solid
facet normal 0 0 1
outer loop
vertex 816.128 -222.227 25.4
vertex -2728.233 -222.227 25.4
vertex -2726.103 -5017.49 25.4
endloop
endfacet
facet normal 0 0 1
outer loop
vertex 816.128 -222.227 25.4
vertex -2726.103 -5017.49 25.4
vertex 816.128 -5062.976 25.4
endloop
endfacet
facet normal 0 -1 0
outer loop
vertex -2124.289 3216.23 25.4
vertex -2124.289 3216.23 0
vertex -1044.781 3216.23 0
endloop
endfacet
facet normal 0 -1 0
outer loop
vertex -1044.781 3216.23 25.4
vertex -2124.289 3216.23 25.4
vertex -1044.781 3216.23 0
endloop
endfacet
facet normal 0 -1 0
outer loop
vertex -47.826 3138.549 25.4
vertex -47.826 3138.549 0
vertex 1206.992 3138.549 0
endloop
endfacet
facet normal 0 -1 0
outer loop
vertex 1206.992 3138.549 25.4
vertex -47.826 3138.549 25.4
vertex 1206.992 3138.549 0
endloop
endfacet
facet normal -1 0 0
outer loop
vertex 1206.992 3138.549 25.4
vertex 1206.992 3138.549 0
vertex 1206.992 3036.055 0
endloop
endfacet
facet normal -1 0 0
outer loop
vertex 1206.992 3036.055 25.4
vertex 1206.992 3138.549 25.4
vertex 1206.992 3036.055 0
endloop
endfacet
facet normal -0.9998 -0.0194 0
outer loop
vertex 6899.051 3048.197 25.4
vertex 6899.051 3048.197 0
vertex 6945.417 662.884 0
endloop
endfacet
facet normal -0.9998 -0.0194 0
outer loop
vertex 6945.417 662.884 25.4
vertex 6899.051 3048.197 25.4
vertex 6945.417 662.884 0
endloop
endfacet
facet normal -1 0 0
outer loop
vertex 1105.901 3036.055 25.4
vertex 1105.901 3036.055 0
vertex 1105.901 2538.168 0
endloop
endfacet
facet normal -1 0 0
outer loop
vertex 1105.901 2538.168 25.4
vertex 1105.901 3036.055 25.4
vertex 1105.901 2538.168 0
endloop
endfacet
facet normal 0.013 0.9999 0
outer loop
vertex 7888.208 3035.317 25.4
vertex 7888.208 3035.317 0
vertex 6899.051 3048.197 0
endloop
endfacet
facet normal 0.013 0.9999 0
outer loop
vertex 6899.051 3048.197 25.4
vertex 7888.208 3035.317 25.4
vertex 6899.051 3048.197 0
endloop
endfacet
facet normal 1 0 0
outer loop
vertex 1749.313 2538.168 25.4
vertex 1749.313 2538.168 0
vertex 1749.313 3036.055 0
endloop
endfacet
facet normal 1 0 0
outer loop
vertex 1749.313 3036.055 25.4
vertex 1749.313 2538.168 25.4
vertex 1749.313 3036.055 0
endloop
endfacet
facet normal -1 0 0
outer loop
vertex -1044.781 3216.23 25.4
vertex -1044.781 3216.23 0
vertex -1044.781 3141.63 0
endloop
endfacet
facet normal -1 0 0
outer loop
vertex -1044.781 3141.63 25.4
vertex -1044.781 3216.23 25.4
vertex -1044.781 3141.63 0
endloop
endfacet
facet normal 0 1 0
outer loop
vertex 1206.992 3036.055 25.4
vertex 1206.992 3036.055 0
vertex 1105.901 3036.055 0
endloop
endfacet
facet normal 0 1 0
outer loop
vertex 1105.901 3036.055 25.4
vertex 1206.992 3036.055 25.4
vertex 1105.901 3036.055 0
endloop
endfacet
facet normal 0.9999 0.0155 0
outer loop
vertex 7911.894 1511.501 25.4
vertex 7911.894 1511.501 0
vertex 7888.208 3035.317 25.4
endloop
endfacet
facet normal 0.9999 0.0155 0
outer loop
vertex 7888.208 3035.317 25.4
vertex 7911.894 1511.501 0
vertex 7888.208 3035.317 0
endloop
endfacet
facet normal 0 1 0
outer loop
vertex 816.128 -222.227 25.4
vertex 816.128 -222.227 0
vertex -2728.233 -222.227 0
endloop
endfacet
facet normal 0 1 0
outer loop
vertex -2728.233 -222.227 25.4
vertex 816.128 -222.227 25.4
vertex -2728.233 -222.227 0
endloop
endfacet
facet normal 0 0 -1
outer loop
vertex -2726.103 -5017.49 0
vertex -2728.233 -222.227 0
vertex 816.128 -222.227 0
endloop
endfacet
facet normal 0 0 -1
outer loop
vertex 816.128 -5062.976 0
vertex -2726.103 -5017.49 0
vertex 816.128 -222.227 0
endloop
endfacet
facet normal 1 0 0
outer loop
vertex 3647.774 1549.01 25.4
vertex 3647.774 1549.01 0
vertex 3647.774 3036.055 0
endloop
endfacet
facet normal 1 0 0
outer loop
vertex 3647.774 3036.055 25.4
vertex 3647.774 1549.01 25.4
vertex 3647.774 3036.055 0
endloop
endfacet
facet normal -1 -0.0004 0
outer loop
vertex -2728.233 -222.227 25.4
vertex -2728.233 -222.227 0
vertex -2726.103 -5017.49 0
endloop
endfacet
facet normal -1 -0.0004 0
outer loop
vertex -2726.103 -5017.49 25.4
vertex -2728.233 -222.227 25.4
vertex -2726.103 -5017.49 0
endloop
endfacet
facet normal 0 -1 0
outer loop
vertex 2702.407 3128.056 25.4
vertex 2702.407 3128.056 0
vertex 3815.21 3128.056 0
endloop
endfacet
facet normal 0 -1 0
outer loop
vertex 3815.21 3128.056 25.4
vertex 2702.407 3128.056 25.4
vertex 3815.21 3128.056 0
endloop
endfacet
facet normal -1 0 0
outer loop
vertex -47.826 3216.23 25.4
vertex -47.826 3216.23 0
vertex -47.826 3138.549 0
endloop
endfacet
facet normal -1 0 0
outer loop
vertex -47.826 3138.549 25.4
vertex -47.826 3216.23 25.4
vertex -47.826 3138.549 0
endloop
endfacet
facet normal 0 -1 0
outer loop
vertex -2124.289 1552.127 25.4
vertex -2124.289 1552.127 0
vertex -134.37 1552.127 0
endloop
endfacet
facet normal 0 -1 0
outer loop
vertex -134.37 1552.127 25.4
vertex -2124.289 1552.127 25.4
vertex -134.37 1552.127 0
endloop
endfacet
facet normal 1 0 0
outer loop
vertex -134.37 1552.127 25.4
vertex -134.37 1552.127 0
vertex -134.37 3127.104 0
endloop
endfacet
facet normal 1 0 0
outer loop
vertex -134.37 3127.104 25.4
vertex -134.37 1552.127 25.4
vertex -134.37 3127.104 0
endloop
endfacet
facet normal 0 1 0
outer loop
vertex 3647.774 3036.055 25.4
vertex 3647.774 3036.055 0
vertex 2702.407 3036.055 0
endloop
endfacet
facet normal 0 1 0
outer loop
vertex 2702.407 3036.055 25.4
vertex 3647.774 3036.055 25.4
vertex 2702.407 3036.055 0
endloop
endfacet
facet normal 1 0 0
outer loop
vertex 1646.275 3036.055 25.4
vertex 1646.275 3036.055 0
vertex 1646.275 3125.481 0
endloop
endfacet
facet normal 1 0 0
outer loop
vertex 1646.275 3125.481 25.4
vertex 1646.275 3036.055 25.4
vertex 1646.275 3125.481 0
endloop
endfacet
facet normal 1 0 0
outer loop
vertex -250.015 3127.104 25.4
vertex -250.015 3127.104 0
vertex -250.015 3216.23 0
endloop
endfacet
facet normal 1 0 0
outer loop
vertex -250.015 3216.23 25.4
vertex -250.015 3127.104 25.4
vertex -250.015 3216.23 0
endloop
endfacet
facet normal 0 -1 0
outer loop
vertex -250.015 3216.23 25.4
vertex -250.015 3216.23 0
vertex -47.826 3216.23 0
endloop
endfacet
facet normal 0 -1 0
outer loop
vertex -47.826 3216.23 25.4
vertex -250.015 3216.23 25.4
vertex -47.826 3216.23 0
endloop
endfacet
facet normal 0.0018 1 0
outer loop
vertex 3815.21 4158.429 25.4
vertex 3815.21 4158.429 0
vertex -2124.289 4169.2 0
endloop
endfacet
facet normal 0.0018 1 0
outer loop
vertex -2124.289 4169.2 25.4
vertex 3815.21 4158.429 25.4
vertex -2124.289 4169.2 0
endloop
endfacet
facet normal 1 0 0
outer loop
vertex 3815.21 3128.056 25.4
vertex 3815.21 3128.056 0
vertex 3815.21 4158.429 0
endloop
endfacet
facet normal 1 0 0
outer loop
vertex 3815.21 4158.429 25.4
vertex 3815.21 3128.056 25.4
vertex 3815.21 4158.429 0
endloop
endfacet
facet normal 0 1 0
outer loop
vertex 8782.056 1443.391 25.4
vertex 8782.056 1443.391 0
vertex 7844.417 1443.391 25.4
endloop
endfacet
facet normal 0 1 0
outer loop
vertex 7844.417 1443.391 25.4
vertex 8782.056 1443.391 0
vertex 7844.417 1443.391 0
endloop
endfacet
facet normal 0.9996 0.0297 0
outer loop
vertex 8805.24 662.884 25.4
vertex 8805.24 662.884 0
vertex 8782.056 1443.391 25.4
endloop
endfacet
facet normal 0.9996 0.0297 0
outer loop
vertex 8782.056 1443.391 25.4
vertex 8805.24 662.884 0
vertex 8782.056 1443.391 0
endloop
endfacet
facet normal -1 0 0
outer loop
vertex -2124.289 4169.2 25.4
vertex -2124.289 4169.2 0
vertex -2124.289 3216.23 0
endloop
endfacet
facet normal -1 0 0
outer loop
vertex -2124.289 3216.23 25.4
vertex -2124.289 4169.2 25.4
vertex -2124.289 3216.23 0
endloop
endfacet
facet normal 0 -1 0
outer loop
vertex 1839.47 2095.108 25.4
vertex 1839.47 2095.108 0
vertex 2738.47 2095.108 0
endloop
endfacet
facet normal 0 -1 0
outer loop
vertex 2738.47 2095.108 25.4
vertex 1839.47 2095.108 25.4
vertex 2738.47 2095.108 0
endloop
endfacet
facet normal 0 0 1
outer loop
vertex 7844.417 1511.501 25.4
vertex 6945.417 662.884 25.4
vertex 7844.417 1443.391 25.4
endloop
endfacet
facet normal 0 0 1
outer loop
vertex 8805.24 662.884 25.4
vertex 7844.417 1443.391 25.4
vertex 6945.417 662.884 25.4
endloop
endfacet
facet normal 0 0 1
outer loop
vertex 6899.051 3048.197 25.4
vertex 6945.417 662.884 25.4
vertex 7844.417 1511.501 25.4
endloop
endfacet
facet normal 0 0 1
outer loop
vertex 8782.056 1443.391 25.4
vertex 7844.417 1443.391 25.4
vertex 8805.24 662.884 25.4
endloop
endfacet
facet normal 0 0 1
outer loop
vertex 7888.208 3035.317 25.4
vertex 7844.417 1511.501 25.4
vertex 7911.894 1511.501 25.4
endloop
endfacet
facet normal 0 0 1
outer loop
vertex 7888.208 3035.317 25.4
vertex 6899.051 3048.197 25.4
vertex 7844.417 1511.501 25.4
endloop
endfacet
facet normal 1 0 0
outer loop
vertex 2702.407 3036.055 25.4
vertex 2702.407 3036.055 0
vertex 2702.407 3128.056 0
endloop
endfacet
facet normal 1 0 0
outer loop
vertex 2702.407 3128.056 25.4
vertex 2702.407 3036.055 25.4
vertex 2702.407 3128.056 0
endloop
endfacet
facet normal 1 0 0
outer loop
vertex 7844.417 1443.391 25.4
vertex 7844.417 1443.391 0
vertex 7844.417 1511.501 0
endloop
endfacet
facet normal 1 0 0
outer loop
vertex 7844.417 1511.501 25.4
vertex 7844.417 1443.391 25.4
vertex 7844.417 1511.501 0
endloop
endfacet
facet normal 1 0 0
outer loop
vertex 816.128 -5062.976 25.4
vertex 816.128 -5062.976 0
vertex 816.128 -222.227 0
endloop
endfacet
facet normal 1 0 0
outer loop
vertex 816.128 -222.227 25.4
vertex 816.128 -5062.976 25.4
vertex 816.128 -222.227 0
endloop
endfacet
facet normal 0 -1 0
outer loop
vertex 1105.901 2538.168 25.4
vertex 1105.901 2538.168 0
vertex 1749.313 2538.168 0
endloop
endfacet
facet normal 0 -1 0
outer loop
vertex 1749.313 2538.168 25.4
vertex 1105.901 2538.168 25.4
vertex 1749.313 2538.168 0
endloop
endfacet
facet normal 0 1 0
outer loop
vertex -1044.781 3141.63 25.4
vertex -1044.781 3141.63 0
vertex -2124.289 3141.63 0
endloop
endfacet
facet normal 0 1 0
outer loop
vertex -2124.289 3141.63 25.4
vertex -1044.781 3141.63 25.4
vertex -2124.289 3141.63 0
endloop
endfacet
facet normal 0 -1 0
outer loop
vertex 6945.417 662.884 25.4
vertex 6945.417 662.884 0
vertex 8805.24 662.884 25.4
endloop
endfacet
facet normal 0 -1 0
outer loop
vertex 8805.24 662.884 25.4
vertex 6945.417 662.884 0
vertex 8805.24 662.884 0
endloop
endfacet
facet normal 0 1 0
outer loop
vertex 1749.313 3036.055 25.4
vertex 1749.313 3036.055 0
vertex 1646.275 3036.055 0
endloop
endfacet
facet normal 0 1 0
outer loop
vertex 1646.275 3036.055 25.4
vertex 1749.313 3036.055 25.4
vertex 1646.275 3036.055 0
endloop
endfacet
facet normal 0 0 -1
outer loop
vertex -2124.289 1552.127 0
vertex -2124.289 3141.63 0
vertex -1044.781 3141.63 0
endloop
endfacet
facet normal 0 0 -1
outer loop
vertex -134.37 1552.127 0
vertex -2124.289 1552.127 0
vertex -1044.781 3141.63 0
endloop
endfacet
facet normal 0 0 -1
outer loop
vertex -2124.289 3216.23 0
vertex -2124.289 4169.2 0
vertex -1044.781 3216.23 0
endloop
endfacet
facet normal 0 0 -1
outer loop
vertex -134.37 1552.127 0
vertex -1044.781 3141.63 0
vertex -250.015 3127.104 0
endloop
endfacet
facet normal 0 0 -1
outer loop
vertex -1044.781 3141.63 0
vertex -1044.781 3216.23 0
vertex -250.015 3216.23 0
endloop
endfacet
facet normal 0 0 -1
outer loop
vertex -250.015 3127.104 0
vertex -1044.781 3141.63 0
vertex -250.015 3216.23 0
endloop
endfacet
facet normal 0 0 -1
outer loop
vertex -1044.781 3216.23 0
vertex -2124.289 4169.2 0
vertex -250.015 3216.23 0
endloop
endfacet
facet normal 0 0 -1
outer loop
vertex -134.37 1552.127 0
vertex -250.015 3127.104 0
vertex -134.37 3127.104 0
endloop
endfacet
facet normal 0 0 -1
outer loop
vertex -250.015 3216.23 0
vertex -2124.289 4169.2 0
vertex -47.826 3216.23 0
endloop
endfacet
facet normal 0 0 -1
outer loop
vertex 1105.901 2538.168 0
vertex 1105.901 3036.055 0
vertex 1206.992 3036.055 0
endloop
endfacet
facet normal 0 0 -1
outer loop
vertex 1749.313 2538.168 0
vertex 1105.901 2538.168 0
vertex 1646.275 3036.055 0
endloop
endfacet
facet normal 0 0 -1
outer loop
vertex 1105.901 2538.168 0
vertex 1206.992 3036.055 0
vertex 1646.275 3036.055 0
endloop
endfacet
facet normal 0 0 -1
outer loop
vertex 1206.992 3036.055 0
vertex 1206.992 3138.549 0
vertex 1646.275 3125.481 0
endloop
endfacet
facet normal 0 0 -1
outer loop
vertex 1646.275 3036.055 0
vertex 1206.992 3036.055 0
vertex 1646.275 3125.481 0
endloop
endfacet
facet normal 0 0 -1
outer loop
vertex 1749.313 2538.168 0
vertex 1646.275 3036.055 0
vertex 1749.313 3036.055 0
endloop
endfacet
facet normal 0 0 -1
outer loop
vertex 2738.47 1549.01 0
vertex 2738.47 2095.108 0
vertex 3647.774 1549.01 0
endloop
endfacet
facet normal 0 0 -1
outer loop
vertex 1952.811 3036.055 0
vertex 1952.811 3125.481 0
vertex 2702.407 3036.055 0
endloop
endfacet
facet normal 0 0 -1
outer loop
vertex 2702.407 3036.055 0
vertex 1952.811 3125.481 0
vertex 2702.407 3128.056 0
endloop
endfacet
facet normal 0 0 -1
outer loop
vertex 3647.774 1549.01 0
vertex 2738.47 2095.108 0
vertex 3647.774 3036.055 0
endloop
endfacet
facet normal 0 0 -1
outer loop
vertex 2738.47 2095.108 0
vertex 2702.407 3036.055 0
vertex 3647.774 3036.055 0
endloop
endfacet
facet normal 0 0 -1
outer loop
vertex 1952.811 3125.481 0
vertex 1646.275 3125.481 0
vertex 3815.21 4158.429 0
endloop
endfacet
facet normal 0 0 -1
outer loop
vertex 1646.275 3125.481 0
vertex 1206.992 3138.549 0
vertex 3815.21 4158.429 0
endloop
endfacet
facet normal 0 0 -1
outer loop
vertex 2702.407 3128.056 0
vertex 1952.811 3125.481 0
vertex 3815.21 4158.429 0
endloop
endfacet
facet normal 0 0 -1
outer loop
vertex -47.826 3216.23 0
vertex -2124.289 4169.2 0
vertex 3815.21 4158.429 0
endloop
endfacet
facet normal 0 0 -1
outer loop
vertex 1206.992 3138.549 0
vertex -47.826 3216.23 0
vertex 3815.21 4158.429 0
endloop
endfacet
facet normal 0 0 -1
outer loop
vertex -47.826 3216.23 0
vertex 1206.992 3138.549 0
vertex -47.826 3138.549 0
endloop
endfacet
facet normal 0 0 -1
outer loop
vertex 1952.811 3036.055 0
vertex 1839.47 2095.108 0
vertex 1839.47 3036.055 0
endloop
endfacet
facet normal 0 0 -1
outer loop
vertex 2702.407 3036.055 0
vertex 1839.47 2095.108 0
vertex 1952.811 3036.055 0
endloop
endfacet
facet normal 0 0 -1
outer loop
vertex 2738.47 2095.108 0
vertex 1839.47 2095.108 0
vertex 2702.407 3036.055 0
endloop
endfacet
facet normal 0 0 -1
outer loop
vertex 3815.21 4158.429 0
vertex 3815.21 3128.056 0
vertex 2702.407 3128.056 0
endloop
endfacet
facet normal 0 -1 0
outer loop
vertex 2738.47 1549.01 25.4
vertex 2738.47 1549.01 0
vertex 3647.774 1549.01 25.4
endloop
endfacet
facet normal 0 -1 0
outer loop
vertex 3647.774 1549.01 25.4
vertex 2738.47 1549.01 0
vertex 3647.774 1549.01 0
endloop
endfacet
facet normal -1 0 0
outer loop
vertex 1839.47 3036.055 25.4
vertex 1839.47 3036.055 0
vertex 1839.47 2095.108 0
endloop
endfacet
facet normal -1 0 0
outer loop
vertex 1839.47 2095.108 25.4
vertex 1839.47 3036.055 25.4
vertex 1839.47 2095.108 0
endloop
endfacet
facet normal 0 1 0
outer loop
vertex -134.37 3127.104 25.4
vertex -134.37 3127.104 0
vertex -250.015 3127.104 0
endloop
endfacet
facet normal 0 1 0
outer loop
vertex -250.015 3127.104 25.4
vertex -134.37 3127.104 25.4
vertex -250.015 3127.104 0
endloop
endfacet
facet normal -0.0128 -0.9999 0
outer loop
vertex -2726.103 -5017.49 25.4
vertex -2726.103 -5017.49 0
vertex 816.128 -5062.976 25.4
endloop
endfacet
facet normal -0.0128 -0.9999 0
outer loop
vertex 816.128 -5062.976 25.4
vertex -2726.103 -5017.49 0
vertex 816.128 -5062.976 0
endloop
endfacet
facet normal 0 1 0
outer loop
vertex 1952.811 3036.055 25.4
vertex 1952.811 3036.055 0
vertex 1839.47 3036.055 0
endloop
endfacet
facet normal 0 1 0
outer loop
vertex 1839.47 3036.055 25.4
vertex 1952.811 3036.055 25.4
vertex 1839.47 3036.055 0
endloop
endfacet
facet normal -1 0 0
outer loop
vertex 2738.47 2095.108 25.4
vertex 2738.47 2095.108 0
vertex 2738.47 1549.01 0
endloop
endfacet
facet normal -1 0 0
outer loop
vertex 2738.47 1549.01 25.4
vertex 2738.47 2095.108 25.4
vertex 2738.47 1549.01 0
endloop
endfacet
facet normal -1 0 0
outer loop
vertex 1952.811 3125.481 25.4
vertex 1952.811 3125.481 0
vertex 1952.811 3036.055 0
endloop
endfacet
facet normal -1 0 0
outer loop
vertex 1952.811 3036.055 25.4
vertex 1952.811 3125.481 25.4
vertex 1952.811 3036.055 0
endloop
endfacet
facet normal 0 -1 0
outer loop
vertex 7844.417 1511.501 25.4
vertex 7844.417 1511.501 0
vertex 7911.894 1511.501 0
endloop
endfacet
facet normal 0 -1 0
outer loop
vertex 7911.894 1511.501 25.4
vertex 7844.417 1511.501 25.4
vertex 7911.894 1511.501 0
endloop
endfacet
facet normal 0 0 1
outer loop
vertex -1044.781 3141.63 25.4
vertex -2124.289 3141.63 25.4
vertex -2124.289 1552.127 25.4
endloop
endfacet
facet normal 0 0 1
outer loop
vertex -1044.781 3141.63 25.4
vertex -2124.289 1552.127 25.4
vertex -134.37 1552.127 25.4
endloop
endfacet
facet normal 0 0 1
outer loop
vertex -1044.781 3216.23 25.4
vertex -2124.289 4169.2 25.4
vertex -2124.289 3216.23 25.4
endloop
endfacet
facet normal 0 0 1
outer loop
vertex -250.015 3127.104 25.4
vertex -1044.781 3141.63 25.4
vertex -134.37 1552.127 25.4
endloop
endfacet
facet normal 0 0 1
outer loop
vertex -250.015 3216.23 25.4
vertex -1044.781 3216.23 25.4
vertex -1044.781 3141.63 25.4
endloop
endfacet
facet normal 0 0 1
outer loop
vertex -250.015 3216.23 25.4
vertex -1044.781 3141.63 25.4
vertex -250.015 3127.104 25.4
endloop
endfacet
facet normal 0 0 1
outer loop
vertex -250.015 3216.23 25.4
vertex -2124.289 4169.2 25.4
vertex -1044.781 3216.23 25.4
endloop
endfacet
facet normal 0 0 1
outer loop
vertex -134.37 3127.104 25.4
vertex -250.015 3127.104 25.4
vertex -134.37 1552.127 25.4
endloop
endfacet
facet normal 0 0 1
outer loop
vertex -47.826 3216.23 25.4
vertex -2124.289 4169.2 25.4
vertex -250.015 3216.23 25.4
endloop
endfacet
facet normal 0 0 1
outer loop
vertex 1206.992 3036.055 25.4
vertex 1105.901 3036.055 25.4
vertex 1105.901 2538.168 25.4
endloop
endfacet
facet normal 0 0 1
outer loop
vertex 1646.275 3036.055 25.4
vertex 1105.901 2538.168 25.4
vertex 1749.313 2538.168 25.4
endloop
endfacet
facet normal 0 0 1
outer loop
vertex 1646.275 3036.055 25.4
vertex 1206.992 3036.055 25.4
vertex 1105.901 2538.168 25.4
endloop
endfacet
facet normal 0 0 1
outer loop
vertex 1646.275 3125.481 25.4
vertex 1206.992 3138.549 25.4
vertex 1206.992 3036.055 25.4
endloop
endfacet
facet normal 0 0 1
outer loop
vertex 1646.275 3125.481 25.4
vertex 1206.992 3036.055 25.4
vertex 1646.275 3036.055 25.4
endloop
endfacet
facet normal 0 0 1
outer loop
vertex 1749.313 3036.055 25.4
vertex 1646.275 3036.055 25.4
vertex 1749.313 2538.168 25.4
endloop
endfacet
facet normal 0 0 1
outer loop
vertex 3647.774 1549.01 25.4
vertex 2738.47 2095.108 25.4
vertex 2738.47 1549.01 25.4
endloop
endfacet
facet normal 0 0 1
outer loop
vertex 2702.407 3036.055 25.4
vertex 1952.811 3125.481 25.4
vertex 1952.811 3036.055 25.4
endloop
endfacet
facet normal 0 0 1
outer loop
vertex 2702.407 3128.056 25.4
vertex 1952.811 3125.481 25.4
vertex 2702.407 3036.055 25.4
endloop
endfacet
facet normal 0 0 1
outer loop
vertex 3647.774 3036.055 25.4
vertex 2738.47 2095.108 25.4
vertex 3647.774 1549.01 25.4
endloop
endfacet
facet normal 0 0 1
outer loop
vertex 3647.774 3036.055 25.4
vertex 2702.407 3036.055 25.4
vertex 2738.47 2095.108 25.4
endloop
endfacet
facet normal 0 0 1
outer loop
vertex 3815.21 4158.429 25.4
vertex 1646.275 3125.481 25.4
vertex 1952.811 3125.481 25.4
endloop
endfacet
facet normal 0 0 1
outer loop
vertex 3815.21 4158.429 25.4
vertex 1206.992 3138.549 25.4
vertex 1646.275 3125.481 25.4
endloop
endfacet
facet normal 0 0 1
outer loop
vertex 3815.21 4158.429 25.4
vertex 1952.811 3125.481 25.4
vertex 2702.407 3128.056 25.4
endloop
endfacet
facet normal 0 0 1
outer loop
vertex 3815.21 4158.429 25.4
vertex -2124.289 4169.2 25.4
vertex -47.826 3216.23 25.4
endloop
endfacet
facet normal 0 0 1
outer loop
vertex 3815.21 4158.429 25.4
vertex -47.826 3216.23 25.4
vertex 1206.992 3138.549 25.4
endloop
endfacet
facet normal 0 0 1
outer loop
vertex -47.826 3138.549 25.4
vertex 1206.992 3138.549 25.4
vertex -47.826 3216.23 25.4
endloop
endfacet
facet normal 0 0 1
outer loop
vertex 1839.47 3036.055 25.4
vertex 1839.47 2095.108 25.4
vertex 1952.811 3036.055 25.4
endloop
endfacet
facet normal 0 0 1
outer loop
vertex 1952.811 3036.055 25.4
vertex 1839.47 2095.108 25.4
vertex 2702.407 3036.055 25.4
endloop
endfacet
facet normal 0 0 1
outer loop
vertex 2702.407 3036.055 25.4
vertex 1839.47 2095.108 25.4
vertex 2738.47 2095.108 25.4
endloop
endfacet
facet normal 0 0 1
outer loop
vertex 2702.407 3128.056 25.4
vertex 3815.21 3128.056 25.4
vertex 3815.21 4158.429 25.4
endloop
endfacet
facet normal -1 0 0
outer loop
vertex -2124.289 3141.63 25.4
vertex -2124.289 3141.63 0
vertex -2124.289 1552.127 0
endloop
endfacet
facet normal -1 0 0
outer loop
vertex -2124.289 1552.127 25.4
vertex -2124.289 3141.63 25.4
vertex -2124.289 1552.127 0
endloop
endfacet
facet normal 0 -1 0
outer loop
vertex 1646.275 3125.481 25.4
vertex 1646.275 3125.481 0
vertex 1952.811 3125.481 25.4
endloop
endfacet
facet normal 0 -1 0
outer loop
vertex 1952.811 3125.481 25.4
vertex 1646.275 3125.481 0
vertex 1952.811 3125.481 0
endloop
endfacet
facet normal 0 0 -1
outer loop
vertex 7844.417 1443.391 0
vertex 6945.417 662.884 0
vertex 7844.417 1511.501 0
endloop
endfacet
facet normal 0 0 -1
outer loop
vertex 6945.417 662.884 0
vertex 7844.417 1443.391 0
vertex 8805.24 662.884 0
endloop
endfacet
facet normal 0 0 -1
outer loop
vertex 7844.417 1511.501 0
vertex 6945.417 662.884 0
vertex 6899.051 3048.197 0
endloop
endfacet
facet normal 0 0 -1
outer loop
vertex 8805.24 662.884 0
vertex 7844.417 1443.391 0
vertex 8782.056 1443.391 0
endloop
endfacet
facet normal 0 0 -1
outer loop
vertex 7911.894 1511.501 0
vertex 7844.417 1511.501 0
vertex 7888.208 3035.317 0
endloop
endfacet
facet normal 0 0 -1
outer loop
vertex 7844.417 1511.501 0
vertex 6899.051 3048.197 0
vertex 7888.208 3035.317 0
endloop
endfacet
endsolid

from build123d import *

# Parameters (mm, degrees)
F1_DEPTH = 25.4
F2_DEPTH = 25.4
F3_DEPTH = 25.4


with BuildPart() as f1:
    # F0 (on Top) → F1 (new body)
    with BuildSketch(Plane.XY):
        Polygon((-2728.2330813421, -222.2274847333), (-2726.1031090565, -5017.4901109881), (816.1276547891, -5062.9762998701), (816.1276547891, -222.2274847333), align=None)
    extrude(amount=F1_DEPTH)


with BuildPart() as f2:
    # F0 (on Top) → F2 (new body)
    with BuildSketch(Plane.XY):
        Polygon((7888.2079124451, 3035.3169441223), (6899.0507125854, 3048.196554184), (6945.4174041748, 662.8842353821), (8805.2396774292, 662.8842353821), (8782.0558547974, 1443.3914422989), (7844.4170951843, 1443.3914422989), (7844.4170951843, 1511.5010225121), (7911.8941330612, 1511.5010225121), align=None)
    extrude(amount=F2_DEPTH)


with BuildPart() as f3:
    # F0 (on Top) → F3 (new body)
    with BuildSketch(Plane.XY):
        Polygon((3815.2096271515, 4158.4286689758), (-2124.28855896, 4169.2004203796), (-2124.28855896, 3216.2303924561), (-1044.7806119919, 3216.2303924561), (-1044.7806119919, 3141.6304111481), (-2124.28855896, 3141.6304111481), (-2124.28855896, 1552.127122879), (-134.369879961, 1552.127122879), (-134.369879961, 3127.103805542), (-250.0150203705, 3127.103805542), (-250.0150203705, 3216.2303924561), (-47.8258170187, 3216.2303924561), (-47.8258170187, 3138.5490894318), (1206.9922685623, 3138.5490894318), (1206.9922685623, 3036.0553264618), (1105.9012413025, 3036.0553264618), (1105.9012413025, 2538.1681919098), (1749.3126392365, 2538.1681919098), (1749.3126392365, 3036.0553264618), (1646.2754011154, 3036.0553264618), (1646.2754011154, 3125.4806518555), (1952.8112411499, 3125.4806518555), (1952.8112411499, 3036.0553264618), (1839.4702672958, 3036.0553264618), (1839.4702672958, 2095.1080322266), (2738.4703159332, 2095.1080322266), (2738.4703159332, 1549.0103960037), (3647.7742195129, 1549.0103960037), (3647.7742195129, 3036.0553264618), (2702.4071216583, 3036.0553264618), (2702.4071216583, 3128.0562877655), (3815.2096271515, 3128.0562877655), align=None)
    extrude(amount=F3_DEPTH)


solid = Compound([f1.part, f2.part, f3.part])
